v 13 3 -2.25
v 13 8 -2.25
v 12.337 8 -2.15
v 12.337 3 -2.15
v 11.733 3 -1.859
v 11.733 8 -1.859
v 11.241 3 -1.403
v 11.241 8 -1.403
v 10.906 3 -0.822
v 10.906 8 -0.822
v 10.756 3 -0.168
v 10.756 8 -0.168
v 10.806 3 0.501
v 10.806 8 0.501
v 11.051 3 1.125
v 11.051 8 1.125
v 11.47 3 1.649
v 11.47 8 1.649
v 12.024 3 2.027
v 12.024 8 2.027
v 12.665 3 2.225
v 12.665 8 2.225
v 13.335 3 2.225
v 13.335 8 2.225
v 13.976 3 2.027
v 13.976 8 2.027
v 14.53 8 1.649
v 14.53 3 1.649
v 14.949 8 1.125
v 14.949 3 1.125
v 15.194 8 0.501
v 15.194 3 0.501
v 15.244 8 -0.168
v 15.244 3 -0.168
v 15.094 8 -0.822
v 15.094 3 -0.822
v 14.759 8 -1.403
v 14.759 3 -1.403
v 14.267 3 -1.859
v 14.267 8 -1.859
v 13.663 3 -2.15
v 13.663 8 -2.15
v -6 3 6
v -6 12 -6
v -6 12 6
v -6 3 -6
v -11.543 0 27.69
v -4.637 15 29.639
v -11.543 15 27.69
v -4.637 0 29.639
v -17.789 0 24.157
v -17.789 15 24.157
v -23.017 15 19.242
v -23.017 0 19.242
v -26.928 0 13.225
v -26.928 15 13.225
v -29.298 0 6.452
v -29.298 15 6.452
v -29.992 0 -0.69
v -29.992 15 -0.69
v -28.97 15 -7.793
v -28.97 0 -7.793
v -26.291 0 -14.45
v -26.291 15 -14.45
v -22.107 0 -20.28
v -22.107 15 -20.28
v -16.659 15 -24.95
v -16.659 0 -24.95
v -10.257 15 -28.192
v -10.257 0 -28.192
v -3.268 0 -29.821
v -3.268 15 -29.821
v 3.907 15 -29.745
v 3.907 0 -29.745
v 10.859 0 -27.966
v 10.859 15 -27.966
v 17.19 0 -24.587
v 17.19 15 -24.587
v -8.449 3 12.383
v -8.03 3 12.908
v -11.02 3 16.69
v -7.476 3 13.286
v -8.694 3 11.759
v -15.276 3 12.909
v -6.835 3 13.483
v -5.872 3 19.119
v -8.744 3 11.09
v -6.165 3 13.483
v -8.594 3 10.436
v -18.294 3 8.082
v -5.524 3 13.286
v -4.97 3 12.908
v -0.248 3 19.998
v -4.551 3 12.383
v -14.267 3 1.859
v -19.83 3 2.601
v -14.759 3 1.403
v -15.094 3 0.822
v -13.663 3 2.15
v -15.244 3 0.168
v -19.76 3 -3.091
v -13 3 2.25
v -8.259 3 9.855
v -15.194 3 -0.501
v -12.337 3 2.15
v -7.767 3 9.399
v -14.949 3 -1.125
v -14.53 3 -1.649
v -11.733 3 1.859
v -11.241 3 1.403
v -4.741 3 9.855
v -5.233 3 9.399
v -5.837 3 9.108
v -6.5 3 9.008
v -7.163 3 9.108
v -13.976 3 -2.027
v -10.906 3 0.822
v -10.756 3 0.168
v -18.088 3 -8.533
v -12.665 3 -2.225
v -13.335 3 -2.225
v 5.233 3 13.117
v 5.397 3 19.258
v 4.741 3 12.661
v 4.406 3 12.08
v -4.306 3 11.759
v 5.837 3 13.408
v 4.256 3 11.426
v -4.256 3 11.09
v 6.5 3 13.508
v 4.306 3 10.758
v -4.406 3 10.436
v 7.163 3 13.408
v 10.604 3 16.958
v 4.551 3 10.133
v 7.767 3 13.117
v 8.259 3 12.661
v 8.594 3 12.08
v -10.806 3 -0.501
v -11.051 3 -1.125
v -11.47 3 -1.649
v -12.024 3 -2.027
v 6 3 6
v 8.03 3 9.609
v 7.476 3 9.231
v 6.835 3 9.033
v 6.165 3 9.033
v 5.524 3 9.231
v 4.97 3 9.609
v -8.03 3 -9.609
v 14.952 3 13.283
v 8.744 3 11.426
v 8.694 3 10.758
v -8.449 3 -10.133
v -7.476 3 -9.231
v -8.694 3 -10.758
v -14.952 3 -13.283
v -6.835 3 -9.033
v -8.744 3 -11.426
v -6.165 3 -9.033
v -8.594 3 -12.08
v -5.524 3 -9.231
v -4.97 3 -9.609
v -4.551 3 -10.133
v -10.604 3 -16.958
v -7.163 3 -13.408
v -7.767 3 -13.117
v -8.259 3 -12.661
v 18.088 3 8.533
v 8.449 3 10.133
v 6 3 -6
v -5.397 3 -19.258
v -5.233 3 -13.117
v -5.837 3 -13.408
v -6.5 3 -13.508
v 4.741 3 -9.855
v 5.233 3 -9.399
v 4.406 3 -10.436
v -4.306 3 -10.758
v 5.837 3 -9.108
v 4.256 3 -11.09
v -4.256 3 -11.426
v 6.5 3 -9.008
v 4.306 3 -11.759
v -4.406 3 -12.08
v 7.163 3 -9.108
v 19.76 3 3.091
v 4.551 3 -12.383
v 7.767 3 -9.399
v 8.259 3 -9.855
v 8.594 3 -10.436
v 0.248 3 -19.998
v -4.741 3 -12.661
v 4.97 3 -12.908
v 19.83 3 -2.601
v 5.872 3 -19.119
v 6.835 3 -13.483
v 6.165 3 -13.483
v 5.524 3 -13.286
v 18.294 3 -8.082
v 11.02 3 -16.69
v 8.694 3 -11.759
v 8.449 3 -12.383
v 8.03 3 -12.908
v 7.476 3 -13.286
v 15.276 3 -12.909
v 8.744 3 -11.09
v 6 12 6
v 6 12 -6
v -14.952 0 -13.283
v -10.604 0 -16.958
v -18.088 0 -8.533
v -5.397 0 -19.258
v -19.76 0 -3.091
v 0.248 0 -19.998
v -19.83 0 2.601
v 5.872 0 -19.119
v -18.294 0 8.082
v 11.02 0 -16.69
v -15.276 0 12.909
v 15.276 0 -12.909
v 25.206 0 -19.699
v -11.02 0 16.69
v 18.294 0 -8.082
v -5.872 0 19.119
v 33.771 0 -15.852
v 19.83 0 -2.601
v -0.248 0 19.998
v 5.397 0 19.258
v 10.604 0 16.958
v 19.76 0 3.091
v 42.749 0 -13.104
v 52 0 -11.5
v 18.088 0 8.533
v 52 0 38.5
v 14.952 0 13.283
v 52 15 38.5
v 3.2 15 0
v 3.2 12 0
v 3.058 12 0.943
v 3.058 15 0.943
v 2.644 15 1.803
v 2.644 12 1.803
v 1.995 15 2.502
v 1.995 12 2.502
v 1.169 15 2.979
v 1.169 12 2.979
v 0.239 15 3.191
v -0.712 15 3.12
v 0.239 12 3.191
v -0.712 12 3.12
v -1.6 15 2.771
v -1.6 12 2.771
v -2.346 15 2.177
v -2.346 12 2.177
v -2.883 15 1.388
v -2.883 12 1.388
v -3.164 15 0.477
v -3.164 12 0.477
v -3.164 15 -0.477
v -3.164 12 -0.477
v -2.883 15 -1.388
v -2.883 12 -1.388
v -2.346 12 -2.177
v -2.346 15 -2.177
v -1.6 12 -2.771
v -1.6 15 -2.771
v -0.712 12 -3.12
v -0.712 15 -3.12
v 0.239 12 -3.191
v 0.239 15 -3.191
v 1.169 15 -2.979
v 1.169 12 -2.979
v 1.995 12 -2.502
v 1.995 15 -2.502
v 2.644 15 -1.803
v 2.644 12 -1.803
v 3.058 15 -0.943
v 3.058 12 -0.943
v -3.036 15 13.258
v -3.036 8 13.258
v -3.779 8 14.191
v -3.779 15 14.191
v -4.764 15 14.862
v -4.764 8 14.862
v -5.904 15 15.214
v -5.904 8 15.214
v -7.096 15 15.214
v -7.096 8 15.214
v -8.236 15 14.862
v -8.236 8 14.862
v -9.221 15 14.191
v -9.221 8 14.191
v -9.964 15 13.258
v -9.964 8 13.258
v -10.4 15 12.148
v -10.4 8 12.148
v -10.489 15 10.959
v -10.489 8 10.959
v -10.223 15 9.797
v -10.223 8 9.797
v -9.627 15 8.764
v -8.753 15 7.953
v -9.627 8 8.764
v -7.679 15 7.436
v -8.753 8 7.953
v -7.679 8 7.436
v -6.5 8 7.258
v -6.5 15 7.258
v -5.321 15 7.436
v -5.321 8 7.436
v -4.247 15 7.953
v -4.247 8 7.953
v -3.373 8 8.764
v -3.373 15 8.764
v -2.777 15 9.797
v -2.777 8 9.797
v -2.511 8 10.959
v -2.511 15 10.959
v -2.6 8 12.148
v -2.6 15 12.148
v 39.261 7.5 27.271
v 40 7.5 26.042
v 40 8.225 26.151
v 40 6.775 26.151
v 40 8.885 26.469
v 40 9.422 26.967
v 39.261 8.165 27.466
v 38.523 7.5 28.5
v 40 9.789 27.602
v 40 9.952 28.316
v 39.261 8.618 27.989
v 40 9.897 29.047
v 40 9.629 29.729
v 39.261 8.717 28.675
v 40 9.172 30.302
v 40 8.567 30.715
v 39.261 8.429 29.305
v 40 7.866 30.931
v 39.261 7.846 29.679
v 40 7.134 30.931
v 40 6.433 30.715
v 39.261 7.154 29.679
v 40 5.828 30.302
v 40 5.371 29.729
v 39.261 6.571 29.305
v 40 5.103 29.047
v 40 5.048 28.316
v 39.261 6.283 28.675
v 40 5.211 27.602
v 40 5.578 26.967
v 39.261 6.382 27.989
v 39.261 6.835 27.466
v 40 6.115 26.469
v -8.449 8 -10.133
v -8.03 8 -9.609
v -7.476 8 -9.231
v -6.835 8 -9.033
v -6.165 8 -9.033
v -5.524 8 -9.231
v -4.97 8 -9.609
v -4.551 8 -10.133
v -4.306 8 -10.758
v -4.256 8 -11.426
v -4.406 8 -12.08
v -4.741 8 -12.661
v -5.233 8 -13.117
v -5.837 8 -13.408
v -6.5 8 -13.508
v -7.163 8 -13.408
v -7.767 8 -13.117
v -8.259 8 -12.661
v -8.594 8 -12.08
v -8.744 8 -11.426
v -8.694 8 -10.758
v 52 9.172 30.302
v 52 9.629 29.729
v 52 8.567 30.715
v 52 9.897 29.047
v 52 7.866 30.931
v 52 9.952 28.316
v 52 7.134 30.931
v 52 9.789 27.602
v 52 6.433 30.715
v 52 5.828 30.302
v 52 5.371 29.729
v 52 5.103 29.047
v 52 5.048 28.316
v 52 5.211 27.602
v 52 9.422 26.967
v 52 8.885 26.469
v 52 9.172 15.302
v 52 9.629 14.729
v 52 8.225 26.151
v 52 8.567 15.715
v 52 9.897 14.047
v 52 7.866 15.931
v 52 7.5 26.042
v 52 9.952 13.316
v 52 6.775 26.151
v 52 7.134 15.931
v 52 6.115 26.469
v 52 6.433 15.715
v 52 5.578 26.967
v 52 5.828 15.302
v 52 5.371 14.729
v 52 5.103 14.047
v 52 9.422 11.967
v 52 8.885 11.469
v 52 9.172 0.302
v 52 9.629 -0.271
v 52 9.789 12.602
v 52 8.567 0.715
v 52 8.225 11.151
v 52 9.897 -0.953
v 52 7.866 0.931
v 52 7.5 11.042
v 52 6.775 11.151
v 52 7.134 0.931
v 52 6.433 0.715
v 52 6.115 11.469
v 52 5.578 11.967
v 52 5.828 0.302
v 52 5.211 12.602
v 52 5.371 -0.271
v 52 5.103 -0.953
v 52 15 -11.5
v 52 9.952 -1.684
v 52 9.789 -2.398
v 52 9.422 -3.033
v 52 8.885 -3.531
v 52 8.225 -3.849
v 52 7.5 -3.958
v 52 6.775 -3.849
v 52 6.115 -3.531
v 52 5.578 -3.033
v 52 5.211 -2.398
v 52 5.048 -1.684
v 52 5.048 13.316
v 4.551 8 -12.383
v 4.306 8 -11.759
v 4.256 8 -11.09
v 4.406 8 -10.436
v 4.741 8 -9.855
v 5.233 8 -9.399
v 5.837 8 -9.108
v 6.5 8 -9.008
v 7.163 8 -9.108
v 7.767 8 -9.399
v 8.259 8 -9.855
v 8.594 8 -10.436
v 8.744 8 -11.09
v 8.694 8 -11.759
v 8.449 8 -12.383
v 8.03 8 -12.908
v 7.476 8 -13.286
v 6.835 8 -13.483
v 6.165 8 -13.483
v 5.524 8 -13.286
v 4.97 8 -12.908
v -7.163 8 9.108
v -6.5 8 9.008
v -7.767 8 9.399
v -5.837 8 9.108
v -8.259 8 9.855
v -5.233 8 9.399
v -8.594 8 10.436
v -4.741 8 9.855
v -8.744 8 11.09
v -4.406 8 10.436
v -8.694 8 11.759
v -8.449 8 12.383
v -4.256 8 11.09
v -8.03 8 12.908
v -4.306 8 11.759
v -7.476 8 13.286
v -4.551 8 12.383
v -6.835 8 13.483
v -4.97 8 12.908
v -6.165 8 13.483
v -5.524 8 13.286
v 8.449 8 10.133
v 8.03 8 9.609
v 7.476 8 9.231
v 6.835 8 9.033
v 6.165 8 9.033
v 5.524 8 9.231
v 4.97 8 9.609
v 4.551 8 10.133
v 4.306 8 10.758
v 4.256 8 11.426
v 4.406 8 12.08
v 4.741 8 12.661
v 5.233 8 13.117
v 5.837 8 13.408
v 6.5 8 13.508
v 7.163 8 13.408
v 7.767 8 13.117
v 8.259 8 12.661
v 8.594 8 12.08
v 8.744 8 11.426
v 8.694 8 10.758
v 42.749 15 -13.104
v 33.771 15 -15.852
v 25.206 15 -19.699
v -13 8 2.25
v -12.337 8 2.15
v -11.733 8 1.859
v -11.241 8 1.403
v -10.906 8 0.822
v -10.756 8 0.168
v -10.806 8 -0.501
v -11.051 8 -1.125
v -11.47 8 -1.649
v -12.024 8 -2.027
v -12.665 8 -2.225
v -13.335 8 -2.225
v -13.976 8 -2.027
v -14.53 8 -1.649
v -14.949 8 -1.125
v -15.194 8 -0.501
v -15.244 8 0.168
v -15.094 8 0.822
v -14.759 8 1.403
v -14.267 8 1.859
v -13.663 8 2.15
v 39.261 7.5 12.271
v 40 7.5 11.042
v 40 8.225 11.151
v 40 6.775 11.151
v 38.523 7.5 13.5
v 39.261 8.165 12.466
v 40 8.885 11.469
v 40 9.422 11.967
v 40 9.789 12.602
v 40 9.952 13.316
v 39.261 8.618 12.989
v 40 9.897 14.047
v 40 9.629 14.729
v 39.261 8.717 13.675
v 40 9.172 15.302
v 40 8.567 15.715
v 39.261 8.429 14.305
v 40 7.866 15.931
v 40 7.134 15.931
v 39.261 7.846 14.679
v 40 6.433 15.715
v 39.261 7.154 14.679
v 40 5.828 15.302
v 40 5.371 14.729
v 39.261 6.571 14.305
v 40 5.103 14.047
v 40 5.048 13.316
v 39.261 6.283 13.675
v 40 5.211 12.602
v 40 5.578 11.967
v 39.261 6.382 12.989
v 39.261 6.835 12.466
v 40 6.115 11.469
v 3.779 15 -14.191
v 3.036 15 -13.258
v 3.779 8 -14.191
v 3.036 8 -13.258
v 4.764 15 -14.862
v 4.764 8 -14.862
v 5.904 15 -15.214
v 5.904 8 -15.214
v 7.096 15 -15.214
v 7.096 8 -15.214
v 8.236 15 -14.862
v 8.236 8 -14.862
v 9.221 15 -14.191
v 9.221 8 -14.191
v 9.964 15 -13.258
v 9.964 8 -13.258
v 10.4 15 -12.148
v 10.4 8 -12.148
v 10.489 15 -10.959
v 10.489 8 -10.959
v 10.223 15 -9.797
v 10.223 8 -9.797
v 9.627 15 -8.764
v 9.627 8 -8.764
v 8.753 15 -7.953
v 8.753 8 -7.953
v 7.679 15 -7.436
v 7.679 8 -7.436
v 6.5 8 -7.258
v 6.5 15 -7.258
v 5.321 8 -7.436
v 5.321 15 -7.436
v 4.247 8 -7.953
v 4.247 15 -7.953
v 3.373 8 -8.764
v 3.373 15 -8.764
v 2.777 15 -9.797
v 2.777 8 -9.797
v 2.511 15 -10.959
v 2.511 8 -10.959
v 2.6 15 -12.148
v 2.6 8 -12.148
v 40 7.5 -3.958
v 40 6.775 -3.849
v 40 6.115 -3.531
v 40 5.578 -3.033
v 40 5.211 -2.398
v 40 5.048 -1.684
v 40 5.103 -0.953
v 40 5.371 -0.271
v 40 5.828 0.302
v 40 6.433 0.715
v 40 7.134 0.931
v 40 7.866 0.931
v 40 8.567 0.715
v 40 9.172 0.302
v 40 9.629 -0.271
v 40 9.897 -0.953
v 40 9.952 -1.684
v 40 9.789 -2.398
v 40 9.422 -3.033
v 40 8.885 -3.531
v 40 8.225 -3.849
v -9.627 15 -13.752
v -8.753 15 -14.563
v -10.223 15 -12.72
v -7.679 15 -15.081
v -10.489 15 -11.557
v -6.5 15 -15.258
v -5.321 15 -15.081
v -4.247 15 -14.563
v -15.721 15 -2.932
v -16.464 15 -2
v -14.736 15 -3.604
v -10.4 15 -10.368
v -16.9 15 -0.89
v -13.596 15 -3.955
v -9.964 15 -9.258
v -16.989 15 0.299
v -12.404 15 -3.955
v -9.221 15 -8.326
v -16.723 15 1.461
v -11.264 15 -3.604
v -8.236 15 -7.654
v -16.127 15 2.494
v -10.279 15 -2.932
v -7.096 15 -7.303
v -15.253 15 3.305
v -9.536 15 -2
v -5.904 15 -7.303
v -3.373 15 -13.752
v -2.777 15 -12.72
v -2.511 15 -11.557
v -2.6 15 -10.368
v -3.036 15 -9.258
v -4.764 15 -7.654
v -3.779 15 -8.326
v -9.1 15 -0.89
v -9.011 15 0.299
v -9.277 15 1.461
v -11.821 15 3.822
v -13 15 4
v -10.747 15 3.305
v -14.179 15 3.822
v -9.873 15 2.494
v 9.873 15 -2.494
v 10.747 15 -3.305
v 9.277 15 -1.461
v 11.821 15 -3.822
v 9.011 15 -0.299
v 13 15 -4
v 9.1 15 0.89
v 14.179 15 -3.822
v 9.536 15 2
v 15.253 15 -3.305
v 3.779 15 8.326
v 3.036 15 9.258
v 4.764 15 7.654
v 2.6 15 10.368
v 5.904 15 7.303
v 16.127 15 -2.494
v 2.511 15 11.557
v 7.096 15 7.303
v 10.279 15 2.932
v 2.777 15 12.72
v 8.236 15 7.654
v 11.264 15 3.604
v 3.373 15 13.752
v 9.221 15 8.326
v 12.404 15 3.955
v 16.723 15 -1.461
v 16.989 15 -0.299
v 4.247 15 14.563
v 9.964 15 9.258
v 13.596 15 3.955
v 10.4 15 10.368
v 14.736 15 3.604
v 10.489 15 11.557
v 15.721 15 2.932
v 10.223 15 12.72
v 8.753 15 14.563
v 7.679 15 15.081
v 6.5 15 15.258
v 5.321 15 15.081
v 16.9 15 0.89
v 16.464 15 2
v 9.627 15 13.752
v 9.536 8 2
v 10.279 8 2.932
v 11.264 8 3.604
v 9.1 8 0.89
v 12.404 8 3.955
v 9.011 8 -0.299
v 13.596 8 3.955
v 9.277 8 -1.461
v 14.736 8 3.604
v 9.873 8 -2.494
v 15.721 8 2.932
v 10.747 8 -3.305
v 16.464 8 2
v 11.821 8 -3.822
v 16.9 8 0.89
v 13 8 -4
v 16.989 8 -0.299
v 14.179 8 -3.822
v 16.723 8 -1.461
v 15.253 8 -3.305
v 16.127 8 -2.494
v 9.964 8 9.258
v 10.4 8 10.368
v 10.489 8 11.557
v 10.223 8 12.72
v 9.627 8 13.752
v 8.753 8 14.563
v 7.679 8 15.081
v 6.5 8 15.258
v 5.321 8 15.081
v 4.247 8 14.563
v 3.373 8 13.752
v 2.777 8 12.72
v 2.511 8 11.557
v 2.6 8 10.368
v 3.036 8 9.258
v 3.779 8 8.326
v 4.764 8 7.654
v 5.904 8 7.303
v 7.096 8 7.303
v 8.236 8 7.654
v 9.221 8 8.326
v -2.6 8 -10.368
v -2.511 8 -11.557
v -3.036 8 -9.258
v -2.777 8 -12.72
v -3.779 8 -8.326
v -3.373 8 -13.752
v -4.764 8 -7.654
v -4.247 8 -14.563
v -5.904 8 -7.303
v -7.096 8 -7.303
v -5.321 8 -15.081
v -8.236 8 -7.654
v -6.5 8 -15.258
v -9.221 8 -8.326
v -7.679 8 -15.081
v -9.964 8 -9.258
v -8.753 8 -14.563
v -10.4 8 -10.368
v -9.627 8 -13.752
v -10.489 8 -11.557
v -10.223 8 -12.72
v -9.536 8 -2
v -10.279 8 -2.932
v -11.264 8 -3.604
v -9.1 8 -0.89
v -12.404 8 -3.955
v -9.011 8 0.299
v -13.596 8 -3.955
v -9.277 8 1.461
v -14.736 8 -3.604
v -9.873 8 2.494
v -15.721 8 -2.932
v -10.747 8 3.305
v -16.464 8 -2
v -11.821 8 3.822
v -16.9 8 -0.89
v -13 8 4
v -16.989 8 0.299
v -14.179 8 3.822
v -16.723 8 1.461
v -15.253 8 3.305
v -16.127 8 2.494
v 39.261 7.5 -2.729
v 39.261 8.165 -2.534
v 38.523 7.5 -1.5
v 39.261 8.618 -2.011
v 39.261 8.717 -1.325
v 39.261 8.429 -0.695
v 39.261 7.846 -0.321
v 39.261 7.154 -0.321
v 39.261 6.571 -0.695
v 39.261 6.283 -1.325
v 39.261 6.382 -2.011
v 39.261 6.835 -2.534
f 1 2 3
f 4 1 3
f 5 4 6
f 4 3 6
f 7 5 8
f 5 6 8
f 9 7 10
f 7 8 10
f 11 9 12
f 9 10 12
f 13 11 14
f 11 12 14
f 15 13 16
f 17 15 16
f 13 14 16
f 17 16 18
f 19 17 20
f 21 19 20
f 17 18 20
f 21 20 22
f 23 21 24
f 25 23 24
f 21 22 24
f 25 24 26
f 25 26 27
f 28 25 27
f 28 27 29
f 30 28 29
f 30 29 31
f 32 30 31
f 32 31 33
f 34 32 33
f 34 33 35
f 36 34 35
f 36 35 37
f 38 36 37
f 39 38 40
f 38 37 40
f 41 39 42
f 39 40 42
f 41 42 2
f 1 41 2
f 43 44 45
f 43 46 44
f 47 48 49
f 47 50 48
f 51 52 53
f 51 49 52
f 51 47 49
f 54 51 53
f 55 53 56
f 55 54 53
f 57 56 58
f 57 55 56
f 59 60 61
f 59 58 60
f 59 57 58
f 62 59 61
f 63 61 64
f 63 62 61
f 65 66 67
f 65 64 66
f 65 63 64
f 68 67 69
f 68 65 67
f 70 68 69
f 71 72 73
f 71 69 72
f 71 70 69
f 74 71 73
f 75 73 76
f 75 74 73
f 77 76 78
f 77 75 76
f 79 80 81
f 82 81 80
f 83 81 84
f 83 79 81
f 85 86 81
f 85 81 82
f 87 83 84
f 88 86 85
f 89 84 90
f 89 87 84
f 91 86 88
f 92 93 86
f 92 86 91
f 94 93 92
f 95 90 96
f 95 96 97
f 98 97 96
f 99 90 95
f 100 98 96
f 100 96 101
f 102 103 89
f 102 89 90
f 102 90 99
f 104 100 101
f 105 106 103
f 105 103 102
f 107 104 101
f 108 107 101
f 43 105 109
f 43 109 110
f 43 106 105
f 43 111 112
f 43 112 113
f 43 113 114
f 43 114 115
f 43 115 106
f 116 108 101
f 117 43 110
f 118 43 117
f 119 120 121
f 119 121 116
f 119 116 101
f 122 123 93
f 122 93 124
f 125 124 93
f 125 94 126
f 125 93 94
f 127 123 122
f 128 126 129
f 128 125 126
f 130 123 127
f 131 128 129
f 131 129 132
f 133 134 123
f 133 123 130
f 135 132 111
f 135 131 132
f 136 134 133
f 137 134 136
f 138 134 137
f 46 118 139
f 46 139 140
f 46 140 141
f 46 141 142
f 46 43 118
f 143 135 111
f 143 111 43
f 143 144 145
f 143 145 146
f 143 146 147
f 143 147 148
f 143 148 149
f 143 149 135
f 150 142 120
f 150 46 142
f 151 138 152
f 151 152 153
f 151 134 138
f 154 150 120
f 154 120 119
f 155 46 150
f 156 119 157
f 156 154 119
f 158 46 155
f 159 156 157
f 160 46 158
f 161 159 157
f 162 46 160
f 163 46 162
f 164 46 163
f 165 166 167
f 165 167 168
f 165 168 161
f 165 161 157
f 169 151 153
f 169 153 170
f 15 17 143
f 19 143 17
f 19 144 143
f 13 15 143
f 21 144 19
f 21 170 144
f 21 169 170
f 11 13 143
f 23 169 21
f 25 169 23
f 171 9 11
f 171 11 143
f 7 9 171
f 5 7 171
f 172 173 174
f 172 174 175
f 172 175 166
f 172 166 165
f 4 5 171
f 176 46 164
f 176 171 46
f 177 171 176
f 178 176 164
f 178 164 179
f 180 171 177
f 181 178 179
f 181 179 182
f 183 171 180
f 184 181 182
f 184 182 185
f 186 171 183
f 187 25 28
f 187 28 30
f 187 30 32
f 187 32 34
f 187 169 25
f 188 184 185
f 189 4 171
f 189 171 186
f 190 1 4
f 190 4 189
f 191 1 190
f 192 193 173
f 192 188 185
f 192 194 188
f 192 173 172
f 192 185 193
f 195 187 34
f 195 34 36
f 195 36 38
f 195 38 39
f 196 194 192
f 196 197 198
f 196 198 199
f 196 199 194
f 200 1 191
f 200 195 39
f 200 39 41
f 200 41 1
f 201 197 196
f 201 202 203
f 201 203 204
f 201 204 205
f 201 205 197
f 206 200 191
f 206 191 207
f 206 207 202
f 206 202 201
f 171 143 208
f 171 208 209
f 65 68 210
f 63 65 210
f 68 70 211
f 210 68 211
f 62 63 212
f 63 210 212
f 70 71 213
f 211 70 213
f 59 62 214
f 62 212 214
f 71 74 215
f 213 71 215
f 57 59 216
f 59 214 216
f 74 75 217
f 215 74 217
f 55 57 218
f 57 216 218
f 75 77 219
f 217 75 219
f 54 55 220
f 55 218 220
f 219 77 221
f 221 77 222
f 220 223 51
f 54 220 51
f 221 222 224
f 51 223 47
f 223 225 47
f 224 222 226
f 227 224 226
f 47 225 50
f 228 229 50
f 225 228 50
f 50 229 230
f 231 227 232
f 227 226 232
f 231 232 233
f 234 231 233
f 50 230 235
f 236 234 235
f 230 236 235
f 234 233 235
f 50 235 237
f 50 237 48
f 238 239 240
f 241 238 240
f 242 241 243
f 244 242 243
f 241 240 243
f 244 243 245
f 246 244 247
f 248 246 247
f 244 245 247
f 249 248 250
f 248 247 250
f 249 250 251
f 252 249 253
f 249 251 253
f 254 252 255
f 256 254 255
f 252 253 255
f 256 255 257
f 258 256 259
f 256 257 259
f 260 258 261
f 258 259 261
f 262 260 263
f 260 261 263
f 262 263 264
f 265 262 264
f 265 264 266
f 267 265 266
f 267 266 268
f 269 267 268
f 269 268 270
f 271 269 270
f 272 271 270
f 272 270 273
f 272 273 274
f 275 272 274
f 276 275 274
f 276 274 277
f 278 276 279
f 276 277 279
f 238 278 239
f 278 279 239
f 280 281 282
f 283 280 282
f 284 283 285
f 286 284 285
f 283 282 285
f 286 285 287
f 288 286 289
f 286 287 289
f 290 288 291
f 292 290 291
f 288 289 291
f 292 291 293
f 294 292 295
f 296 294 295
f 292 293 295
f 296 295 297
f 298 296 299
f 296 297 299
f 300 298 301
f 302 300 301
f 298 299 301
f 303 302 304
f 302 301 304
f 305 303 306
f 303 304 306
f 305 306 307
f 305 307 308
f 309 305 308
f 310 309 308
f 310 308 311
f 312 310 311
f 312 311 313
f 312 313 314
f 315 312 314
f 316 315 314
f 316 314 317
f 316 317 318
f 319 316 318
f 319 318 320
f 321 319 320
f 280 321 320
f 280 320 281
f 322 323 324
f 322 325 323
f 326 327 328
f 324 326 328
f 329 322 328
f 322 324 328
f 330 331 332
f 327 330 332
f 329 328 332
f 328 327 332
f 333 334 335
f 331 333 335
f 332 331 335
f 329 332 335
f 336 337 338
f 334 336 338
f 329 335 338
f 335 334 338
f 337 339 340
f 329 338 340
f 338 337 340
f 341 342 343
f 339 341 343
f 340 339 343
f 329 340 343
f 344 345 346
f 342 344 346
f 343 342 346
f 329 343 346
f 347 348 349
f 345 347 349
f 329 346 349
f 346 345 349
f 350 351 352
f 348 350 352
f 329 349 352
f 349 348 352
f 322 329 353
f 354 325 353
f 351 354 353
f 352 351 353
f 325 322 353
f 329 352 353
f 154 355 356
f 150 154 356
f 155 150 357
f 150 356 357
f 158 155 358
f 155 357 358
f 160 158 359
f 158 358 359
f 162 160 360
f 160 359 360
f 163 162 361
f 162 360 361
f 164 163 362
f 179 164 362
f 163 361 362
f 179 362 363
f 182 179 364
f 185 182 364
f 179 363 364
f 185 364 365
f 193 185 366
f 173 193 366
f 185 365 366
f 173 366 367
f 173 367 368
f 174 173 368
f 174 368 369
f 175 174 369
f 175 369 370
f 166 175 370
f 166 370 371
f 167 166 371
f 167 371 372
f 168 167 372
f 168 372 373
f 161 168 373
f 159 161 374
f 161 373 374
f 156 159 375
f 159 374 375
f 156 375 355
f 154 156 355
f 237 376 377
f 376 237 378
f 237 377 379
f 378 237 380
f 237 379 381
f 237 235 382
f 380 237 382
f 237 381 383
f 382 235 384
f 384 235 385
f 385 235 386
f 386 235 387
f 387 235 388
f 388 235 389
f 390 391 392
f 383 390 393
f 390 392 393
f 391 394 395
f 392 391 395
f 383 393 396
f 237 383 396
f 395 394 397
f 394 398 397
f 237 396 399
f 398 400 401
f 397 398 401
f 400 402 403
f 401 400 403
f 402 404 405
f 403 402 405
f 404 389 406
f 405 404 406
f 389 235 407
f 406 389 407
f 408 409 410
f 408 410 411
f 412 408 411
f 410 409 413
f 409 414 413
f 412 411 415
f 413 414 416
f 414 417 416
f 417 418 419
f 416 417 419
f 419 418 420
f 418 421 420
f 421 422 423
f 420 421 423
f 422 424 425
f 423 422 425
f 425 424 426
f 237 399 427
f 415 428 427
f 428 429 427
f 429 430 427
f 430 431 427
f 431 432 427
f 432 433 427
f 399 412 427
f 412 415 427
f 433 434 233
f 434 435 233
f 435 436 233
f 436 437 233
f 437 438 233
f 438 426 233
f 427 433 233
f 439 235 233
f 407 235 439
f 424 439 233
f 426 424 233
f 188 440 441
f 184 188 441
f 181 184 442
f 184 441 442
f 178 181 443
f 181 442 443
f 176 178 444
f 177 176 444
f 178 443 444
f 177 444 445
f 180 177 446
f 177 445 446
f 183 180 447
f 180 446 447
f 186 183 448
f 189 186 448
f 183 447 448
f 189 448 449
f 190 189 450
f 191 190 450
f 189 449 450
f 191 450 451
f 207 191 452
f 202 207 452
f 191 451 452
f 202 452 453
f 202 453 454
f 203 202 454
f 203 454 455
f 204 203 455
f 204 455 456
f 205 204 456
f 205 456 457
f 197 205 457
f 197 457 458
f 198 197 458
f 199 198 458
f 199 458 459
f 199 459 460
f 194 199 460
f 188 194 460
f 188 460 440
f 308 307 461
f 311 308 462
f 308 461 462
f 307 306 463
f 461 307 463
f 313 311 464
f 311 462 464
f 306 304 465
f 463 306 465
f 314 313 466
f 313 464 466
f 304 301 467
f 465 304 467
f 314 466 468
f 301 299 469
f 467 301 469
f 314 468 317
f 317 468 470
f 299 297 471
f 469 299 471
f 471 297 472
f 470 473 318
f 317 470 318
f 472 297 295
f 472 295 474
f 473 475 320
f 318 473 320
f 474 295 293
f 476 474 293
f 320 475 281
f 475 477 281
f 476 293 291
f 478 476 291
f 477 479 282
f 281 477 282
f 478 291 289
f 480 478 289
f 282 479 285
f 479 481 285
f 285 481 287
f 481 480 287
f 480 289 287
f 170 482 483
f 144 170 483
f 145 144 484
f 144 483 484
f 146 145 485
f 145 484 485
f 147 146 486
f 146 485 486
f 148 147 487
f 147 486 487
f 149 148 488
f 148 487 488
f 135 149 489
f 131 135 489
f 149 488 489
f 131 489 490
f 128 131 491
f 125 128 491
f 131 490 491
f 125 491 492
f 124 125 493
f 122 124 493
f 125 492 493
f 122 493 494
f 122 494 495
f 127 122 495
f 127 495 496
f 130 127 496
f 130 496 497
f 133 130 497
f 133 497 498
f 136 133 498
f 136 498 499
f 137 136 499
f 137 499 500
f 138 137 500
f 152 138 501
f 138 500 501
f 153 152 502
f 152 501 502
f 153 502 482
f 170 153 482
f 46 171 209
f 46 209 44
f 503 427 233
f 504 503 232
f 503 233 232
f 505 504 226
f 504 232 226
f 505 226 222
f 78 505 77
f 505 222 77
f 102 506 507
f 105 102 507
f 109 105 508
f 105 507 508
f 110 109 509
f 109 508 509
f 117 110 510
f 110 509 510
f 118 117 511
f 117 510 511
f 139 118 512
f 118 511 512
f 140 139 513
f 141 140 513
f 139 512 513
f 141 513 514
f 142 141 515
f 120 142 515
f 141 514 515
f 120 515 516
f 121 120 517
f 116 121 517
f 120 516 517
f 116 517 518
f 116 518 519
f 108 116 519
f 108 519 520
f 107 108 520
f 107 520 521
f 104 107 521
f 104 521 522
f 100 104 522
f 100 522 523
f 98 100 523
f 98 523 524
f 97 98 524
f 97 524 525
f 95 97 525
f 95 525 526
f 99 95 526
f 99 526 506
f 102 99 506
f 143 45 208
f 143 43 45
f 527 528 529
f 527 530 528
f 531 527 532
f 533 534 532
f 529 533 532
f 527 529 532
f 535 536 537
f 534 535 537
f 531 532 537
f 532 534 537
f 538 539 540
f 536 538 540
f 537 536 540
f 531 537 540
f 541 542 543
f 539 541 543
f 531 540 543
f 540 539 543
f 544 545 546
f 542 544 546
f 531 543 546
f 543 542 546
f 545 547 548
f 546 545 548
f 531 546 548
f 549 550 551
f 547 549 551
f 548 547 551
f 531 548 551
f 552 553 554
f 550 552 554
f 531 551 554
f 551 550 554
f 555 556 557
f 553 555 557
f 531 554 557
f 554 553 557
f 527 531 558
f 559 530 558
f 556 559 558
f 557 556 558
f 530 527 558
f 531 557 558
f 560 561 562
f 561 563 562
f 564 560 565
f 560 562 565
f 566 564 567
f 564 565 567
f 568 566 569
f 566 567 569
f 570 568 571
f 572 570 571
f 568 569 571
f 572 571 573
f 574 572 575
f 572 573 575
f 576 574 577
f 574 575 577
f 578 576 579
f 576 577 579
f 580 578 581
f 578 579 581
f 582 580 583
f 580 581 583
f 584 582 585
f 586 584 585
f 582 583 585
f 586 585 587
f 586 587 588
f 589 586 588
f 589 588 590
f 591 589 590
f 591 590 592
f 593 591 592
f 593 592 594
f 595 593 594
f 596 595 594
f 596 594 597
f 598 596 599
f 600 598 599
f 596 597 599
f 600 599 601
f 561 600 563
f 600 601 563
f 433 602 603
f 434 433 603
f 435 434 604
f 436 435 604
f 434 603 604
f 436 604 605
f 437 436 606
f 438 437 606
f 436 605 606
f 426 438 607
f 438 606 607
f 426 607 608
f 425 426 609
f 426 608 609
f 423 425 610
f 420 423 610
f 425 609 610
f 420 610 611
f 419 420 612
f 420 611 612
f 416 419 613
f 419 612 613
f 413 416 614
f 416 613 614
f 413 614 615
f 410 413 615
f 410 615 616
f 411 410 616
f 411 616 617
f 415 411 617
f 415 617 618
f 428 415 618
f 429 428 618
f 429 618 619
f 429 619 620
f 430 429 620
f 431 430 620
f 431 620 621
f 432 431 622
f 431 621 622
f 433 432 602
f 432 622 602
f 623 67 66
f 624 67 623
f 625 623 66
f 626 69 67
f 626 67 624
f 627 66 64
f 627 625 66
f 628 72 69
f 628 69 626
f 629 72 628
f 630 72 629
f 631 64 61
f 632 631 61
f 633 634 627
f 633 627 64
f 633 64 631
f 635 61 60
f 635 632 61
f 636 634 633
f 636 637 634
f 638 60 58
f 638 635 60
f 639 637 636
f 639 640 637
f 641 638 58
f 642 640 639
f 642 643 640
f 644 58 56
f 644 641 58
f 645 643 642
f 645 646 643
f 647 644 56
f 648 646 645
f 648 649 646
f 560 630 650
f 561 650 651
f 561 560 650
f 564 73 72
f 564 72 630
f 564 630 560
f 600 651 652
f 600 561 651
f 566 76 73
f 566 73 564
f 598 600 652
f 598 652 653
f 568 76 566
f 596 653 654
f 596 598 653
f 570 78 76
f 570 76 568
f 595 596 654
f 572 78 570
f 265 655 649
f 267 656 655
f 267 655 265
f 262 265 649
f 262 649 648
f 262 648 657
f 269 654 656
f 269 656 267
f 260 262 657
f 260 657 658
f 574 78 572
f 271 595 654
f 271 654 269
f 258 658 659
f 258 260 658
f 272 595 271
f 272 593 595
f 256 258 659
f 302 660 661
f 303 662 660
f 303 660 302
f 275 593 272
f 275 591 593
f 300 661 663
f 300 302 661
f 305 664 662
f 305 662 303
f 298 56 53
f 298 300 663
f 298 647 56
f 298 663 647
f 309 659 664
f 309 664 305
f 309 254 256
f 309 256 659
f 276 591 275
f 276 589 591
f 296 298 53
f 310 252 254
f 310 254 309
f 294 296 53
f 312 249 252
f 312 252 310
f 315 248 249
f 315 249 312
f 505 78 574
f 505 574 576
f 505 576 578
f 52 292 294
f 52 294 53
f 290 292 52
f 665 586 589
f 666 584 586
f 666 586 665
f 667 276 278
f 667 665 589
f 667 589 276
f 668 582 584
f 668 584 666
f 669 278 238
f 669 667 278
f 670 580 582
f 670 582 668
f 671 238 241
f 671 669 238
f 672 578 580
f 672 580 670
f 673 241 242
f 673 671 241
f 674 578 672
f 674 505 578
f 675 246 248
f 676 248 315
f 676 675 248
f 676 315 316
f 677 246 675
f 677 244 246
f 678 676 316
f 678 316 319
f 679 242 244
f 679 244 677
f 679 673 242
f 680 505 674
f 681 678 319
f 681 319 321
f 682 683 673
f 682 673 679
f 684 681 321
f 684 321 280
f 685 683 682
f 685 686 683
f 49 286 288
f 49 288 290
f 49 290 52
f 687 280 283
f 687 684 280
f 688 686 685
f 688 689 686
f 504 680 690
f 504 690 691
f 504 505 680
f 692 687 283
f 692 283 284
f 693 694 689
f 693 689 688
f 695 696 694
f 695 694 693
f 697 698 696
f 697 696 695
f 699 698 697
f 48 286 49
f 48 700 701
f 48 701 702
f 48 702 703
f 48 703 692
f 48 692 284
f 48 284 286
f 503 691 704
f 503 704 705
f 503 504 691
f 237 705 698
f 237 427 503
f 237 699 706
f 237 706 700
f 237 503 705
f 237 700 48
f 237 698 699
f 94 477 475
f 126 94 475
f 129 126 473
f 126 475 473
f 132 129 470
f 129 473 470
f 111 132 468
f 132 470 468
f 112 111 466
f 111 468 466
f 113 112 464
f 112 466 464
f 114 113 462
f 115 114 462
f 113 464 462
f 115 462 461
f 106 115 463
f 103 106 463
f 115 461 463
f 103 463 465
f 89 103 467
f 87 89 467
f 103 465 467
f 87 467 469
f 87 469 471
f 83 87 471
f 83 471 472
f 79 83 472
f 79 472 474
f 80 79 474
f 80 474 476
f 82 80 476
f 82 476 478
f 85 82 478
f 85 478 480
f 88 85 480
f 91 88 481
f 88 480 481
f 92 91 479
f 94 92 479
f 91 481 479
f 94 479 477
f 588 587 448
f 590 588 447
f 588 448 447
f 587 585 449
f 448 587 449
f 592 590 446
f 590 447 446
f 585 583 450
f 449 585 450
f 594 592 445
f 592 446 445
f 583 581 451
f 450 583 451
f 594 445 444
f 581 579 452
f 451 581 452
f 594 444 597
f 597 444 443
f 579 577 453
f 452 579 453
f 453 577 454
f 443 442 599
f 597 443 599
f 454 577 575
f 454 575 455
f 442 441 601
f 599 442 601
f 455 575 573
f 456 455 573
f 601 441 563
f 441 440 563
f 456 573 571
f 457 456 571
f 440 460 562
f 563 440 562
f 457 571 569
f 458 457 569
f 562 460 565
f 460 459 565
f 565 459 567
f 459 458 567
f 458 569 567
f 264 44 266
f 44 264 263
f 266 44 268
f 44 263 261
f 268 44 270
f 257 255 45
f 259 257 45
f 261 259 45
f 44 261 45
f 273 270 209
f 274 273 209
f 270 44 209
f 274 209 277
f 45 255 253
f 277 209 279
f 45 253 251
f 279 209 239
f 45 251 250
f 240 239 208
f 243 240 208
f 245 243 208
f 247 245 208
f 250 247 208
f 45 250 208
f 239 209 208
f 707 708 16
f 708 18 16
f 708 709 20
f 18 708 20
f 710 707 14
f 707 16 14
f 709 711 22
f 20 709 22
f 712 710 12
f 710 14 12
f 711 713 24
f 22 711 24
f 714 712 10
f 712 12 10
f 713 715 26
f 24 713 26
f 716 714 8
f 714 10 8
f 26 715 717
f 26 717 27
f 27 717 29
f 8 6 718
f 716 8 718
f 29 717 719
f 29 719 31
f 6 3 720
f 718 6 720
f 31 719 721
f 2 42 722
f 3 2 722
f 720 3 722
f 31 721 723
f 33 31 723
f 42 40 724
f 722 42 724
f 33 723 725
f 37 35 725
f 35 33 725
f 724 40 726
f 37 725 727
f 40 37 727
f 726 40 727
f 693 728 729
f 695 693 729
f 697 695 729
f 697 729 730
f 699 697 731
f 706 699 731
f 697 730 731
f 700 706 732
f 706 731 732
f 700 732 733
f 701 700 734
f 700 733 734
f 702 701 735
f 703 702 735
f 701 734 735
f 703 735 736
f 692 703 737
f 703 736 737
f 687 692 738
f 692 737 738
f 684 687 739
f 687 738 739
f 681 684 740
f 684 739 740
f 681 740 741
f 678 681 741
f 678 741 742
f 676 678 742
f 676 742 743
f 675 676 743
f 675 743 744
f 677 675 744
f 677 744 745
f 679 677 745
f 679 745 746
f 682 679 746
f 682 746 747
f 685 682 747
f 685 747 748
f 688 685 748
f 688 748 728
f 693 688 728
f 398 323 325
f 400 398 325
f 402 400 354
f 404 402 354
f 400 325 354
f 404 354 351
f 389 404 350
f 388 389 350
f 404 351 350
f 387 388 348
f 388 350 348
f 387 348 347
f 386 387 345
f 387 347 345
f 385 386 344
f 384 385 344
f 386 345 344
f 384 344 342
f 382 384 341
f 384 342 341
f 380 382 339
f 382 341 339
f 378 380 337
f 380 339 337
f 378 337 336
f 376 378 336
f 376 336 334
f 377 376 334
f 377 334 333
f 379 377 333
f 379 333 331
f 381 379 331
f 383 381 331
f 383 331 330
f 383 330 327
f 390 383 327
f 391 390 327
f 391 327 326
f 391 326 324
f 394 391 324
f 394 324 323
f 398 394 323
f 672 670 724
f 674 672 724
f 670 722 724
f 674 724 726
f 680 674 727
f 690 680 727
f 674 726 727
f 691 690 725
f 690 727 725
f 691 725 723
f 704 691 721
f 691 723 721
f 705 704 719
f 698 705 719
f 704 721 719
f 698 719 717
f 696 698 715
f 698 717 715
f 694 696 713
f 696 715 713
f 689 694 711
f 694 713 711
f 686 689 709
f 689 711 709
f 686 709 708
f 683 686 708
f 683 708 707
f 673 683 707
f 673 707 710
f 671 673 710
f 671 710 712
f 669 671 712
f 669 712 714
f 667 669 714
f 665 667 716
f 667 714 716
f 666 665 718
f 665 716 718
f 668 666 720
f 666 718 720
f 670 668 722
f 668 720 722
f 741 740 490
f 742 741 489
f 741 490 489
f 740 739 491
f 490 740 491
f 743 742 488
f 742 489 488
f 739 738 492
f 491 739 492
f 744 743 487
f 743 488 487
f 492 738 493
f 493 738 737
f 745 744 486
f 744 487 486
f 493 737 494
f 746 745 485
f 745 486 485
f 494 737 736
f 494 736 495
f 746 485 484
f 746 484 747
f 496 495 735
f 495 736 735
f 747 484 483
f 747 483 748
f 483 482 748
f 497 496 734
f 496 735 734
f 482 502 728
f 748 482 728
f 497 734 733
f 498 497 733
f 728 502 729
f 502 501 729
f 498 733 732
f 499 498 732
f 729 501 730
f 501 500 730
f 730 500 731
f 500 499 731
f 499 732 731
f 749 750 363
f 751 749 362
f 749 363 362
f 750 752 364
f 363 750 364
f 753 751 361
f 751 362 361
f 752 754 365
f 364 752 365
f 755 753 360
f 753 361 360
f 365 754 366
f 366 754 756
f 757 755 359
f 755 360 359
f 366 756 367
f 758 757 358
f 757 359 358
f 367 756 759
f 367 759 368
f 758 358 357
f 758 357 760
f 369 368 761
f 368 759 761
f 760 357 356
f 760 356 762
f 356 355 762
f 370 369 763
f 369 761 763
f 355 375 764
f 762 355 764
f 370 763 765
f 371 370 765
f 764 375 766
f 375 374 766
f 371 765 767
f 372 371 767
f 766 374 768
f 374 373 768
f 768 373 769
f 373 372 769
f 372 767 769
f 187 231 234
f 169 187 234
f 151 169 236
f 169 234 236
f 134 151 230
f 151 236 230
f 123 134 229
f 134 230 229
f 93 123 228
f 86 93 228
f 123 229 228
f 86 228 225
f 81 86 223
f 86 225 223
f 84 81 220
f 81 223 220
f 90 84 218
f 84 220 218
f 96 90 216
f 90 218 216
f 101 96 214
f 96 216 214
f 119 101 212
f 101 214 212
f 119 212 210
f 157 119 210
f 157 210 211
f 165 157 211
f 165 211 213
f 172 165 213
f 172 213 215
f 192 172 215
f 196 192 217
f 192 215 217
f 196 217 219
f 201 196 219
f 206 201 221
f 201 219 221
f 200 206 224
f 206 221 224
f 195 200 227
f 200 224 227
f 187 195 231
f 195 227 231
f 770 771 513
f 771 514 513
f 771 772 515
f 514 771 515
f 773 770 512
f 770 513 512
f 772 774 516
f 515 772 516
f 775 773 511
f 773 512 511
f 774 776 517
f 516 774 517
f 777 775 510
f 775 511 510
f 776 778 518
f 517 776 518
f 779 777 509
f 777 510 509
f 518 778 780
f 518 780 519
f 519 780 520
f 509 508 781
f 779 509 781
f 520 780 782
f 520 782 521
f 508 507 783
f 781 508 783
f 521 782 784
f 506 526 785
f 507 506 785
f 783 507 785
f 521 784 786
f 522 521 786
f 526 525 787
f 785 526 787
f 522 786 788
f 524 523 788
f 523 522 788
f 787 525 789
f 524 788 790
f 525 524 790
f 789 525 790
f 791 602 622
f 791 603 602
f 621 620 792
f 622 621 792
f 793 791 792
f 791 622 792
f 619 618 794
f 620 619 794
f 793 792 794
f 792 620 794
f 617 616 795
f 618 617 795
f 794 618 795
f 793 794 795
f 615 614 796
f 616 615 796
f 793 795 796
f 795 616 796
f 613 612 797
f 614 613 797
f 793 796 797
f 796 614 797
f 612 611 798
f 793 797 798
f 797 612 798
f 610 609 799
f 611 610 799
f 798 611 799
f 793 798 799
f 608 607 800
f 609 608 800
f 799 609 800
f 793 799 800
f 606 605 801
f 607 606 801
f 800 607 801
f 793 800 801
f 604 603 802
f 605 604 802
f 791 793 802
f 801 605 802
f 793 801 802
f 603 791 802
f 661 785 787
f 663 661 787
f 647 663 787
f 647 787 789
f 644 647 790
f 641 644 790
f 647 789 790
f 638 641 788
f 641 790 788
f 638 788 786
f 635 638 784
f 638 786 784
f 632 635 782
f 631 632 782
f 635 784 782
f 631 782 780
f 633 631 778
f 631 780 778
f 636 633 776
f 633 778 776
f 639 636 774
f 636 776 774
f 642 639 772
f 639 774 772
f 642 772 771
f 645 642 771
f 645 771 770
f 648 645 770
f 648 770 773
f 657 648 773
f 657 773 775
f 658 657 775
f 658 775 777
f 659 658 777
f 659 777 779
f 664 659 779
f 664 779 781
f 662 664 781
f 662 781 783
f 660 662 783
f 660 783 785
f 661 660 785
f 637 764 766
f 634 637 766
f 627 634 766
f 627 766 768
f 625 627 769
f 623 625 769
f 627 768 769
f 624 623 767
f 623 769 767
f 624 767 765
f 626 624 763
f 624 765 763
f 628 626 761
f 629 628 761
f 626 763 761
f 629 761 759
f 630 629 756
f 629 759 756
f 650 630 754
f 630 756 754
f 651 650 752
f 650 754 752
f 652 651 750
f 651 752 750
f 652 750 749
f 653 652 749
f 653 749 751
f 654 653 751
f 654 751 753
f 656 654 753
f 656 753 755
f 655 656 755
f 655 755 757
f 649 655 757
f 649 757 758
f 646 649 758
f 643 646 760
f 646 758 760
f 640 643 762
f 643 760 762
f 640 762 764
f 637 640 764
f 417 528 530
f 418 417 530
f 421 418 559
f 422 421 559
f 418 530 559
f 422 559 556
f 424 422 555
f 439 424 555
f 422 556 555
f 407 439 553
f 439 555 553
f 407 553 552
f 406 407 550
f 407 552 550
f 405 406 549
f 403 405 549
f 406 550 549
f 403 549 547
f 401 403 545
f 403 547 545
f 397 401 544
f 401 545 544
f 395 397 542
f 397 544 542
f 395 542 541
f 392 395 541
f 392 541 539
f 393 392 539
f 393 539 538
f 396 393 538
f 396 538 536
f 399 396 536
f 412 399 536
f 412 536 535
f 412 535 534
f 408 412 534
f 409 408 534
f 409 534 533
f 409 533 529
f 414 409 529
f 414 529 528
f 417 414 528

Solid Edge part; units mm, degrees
sketch "Sketch1" plane through (0, 0, 0) normal (0, -1, 0) x (1, 0, 0)
  line L0 (52, 38.5) -> (52, -11.5)
  line L1 (52, 38.5) -> (-4.6369, 29.6395)
  arc A0 (52, -11.5) -> (17.1896, -24.587) centre (60.1635, -86.0544) ccw
  arc A1 (17.1896, -24.587) -> (-4.6369, 29.6395) centre (0, 0) cw
  dimension "D1" = 52
  dimension "D2" = 60
  dimension "D3" = 50
  dimension "D4" = 38.5
  dimension "D5" = 150
extrude "Protrusion1" add sketch "Sketch1" against normal blind 15
sketch "Sketch2" plane through (11, 0, 4.25) normal (0, -1, 0) x (0.9879828, 0, 0.1545642)
  circle A0 centre (-11.5247, -2.4987) radius 20
  dimension "D1" = 40
extrude "VaciadoExtruido_1" cut sketch "Sketch2" against normal blind 3
sketch "Sketch3" plane through (0, 3, 0) normal (0, -1, 0) x (1, 0, 0)
  line L0 (6, -6) -> (-6, -6)
  line L1 (-6, -6) -> (-6, 6)
  line L2 (-6, 6) -> (6, 6)
  line L3 (6, 6) -> (6, -6)
  dimension "D1" = 12
  dimension "D2" = 12
extrude "VaciadoExtruido_2" cut sketch "Sketch3" against normal blind 9
sketch "Sketch4" plane through (0, 12, 0) normal (0, -1, 0) x (1, 0, 0)
  circle A0 centre (0, 0) radius 3.2
  dimension "D1" = 6.4
extrude "Cutout1" cut sketch "Sketch4" against normal through all
hole "Agujero_1" at (-13, 15, 0) direction (0, -1, 0) diameter 4.5 end up to next counterbore diameter 8 counterbore depth 7
pattern_circular "Pattern1" count 6 over 360 about axis through (0, 15, 0) along (0, 1, 0) of "Agujero_1"
hole "Agujero_7" at (52, 7.5, 28.5) direction (-1, 0, 0) diameter 4.917 depth 12 tip angle 118 thread major 6 thread length 10
hole "Hole6" at (52, 7.5, 13.5) direction (-1, 0, 0) diameter 4.917 depth 12 tip angle 118 thread major 6 thread length 10
hole "Hole7" at (52, 7.5, -1.5) direction (-1, 0, 0) diameter 4.917 depth 12 tip angle 118 thread major 6 thread length 10
properties part number "1976-1400-001" material "Aluminio, 7075-T6"
